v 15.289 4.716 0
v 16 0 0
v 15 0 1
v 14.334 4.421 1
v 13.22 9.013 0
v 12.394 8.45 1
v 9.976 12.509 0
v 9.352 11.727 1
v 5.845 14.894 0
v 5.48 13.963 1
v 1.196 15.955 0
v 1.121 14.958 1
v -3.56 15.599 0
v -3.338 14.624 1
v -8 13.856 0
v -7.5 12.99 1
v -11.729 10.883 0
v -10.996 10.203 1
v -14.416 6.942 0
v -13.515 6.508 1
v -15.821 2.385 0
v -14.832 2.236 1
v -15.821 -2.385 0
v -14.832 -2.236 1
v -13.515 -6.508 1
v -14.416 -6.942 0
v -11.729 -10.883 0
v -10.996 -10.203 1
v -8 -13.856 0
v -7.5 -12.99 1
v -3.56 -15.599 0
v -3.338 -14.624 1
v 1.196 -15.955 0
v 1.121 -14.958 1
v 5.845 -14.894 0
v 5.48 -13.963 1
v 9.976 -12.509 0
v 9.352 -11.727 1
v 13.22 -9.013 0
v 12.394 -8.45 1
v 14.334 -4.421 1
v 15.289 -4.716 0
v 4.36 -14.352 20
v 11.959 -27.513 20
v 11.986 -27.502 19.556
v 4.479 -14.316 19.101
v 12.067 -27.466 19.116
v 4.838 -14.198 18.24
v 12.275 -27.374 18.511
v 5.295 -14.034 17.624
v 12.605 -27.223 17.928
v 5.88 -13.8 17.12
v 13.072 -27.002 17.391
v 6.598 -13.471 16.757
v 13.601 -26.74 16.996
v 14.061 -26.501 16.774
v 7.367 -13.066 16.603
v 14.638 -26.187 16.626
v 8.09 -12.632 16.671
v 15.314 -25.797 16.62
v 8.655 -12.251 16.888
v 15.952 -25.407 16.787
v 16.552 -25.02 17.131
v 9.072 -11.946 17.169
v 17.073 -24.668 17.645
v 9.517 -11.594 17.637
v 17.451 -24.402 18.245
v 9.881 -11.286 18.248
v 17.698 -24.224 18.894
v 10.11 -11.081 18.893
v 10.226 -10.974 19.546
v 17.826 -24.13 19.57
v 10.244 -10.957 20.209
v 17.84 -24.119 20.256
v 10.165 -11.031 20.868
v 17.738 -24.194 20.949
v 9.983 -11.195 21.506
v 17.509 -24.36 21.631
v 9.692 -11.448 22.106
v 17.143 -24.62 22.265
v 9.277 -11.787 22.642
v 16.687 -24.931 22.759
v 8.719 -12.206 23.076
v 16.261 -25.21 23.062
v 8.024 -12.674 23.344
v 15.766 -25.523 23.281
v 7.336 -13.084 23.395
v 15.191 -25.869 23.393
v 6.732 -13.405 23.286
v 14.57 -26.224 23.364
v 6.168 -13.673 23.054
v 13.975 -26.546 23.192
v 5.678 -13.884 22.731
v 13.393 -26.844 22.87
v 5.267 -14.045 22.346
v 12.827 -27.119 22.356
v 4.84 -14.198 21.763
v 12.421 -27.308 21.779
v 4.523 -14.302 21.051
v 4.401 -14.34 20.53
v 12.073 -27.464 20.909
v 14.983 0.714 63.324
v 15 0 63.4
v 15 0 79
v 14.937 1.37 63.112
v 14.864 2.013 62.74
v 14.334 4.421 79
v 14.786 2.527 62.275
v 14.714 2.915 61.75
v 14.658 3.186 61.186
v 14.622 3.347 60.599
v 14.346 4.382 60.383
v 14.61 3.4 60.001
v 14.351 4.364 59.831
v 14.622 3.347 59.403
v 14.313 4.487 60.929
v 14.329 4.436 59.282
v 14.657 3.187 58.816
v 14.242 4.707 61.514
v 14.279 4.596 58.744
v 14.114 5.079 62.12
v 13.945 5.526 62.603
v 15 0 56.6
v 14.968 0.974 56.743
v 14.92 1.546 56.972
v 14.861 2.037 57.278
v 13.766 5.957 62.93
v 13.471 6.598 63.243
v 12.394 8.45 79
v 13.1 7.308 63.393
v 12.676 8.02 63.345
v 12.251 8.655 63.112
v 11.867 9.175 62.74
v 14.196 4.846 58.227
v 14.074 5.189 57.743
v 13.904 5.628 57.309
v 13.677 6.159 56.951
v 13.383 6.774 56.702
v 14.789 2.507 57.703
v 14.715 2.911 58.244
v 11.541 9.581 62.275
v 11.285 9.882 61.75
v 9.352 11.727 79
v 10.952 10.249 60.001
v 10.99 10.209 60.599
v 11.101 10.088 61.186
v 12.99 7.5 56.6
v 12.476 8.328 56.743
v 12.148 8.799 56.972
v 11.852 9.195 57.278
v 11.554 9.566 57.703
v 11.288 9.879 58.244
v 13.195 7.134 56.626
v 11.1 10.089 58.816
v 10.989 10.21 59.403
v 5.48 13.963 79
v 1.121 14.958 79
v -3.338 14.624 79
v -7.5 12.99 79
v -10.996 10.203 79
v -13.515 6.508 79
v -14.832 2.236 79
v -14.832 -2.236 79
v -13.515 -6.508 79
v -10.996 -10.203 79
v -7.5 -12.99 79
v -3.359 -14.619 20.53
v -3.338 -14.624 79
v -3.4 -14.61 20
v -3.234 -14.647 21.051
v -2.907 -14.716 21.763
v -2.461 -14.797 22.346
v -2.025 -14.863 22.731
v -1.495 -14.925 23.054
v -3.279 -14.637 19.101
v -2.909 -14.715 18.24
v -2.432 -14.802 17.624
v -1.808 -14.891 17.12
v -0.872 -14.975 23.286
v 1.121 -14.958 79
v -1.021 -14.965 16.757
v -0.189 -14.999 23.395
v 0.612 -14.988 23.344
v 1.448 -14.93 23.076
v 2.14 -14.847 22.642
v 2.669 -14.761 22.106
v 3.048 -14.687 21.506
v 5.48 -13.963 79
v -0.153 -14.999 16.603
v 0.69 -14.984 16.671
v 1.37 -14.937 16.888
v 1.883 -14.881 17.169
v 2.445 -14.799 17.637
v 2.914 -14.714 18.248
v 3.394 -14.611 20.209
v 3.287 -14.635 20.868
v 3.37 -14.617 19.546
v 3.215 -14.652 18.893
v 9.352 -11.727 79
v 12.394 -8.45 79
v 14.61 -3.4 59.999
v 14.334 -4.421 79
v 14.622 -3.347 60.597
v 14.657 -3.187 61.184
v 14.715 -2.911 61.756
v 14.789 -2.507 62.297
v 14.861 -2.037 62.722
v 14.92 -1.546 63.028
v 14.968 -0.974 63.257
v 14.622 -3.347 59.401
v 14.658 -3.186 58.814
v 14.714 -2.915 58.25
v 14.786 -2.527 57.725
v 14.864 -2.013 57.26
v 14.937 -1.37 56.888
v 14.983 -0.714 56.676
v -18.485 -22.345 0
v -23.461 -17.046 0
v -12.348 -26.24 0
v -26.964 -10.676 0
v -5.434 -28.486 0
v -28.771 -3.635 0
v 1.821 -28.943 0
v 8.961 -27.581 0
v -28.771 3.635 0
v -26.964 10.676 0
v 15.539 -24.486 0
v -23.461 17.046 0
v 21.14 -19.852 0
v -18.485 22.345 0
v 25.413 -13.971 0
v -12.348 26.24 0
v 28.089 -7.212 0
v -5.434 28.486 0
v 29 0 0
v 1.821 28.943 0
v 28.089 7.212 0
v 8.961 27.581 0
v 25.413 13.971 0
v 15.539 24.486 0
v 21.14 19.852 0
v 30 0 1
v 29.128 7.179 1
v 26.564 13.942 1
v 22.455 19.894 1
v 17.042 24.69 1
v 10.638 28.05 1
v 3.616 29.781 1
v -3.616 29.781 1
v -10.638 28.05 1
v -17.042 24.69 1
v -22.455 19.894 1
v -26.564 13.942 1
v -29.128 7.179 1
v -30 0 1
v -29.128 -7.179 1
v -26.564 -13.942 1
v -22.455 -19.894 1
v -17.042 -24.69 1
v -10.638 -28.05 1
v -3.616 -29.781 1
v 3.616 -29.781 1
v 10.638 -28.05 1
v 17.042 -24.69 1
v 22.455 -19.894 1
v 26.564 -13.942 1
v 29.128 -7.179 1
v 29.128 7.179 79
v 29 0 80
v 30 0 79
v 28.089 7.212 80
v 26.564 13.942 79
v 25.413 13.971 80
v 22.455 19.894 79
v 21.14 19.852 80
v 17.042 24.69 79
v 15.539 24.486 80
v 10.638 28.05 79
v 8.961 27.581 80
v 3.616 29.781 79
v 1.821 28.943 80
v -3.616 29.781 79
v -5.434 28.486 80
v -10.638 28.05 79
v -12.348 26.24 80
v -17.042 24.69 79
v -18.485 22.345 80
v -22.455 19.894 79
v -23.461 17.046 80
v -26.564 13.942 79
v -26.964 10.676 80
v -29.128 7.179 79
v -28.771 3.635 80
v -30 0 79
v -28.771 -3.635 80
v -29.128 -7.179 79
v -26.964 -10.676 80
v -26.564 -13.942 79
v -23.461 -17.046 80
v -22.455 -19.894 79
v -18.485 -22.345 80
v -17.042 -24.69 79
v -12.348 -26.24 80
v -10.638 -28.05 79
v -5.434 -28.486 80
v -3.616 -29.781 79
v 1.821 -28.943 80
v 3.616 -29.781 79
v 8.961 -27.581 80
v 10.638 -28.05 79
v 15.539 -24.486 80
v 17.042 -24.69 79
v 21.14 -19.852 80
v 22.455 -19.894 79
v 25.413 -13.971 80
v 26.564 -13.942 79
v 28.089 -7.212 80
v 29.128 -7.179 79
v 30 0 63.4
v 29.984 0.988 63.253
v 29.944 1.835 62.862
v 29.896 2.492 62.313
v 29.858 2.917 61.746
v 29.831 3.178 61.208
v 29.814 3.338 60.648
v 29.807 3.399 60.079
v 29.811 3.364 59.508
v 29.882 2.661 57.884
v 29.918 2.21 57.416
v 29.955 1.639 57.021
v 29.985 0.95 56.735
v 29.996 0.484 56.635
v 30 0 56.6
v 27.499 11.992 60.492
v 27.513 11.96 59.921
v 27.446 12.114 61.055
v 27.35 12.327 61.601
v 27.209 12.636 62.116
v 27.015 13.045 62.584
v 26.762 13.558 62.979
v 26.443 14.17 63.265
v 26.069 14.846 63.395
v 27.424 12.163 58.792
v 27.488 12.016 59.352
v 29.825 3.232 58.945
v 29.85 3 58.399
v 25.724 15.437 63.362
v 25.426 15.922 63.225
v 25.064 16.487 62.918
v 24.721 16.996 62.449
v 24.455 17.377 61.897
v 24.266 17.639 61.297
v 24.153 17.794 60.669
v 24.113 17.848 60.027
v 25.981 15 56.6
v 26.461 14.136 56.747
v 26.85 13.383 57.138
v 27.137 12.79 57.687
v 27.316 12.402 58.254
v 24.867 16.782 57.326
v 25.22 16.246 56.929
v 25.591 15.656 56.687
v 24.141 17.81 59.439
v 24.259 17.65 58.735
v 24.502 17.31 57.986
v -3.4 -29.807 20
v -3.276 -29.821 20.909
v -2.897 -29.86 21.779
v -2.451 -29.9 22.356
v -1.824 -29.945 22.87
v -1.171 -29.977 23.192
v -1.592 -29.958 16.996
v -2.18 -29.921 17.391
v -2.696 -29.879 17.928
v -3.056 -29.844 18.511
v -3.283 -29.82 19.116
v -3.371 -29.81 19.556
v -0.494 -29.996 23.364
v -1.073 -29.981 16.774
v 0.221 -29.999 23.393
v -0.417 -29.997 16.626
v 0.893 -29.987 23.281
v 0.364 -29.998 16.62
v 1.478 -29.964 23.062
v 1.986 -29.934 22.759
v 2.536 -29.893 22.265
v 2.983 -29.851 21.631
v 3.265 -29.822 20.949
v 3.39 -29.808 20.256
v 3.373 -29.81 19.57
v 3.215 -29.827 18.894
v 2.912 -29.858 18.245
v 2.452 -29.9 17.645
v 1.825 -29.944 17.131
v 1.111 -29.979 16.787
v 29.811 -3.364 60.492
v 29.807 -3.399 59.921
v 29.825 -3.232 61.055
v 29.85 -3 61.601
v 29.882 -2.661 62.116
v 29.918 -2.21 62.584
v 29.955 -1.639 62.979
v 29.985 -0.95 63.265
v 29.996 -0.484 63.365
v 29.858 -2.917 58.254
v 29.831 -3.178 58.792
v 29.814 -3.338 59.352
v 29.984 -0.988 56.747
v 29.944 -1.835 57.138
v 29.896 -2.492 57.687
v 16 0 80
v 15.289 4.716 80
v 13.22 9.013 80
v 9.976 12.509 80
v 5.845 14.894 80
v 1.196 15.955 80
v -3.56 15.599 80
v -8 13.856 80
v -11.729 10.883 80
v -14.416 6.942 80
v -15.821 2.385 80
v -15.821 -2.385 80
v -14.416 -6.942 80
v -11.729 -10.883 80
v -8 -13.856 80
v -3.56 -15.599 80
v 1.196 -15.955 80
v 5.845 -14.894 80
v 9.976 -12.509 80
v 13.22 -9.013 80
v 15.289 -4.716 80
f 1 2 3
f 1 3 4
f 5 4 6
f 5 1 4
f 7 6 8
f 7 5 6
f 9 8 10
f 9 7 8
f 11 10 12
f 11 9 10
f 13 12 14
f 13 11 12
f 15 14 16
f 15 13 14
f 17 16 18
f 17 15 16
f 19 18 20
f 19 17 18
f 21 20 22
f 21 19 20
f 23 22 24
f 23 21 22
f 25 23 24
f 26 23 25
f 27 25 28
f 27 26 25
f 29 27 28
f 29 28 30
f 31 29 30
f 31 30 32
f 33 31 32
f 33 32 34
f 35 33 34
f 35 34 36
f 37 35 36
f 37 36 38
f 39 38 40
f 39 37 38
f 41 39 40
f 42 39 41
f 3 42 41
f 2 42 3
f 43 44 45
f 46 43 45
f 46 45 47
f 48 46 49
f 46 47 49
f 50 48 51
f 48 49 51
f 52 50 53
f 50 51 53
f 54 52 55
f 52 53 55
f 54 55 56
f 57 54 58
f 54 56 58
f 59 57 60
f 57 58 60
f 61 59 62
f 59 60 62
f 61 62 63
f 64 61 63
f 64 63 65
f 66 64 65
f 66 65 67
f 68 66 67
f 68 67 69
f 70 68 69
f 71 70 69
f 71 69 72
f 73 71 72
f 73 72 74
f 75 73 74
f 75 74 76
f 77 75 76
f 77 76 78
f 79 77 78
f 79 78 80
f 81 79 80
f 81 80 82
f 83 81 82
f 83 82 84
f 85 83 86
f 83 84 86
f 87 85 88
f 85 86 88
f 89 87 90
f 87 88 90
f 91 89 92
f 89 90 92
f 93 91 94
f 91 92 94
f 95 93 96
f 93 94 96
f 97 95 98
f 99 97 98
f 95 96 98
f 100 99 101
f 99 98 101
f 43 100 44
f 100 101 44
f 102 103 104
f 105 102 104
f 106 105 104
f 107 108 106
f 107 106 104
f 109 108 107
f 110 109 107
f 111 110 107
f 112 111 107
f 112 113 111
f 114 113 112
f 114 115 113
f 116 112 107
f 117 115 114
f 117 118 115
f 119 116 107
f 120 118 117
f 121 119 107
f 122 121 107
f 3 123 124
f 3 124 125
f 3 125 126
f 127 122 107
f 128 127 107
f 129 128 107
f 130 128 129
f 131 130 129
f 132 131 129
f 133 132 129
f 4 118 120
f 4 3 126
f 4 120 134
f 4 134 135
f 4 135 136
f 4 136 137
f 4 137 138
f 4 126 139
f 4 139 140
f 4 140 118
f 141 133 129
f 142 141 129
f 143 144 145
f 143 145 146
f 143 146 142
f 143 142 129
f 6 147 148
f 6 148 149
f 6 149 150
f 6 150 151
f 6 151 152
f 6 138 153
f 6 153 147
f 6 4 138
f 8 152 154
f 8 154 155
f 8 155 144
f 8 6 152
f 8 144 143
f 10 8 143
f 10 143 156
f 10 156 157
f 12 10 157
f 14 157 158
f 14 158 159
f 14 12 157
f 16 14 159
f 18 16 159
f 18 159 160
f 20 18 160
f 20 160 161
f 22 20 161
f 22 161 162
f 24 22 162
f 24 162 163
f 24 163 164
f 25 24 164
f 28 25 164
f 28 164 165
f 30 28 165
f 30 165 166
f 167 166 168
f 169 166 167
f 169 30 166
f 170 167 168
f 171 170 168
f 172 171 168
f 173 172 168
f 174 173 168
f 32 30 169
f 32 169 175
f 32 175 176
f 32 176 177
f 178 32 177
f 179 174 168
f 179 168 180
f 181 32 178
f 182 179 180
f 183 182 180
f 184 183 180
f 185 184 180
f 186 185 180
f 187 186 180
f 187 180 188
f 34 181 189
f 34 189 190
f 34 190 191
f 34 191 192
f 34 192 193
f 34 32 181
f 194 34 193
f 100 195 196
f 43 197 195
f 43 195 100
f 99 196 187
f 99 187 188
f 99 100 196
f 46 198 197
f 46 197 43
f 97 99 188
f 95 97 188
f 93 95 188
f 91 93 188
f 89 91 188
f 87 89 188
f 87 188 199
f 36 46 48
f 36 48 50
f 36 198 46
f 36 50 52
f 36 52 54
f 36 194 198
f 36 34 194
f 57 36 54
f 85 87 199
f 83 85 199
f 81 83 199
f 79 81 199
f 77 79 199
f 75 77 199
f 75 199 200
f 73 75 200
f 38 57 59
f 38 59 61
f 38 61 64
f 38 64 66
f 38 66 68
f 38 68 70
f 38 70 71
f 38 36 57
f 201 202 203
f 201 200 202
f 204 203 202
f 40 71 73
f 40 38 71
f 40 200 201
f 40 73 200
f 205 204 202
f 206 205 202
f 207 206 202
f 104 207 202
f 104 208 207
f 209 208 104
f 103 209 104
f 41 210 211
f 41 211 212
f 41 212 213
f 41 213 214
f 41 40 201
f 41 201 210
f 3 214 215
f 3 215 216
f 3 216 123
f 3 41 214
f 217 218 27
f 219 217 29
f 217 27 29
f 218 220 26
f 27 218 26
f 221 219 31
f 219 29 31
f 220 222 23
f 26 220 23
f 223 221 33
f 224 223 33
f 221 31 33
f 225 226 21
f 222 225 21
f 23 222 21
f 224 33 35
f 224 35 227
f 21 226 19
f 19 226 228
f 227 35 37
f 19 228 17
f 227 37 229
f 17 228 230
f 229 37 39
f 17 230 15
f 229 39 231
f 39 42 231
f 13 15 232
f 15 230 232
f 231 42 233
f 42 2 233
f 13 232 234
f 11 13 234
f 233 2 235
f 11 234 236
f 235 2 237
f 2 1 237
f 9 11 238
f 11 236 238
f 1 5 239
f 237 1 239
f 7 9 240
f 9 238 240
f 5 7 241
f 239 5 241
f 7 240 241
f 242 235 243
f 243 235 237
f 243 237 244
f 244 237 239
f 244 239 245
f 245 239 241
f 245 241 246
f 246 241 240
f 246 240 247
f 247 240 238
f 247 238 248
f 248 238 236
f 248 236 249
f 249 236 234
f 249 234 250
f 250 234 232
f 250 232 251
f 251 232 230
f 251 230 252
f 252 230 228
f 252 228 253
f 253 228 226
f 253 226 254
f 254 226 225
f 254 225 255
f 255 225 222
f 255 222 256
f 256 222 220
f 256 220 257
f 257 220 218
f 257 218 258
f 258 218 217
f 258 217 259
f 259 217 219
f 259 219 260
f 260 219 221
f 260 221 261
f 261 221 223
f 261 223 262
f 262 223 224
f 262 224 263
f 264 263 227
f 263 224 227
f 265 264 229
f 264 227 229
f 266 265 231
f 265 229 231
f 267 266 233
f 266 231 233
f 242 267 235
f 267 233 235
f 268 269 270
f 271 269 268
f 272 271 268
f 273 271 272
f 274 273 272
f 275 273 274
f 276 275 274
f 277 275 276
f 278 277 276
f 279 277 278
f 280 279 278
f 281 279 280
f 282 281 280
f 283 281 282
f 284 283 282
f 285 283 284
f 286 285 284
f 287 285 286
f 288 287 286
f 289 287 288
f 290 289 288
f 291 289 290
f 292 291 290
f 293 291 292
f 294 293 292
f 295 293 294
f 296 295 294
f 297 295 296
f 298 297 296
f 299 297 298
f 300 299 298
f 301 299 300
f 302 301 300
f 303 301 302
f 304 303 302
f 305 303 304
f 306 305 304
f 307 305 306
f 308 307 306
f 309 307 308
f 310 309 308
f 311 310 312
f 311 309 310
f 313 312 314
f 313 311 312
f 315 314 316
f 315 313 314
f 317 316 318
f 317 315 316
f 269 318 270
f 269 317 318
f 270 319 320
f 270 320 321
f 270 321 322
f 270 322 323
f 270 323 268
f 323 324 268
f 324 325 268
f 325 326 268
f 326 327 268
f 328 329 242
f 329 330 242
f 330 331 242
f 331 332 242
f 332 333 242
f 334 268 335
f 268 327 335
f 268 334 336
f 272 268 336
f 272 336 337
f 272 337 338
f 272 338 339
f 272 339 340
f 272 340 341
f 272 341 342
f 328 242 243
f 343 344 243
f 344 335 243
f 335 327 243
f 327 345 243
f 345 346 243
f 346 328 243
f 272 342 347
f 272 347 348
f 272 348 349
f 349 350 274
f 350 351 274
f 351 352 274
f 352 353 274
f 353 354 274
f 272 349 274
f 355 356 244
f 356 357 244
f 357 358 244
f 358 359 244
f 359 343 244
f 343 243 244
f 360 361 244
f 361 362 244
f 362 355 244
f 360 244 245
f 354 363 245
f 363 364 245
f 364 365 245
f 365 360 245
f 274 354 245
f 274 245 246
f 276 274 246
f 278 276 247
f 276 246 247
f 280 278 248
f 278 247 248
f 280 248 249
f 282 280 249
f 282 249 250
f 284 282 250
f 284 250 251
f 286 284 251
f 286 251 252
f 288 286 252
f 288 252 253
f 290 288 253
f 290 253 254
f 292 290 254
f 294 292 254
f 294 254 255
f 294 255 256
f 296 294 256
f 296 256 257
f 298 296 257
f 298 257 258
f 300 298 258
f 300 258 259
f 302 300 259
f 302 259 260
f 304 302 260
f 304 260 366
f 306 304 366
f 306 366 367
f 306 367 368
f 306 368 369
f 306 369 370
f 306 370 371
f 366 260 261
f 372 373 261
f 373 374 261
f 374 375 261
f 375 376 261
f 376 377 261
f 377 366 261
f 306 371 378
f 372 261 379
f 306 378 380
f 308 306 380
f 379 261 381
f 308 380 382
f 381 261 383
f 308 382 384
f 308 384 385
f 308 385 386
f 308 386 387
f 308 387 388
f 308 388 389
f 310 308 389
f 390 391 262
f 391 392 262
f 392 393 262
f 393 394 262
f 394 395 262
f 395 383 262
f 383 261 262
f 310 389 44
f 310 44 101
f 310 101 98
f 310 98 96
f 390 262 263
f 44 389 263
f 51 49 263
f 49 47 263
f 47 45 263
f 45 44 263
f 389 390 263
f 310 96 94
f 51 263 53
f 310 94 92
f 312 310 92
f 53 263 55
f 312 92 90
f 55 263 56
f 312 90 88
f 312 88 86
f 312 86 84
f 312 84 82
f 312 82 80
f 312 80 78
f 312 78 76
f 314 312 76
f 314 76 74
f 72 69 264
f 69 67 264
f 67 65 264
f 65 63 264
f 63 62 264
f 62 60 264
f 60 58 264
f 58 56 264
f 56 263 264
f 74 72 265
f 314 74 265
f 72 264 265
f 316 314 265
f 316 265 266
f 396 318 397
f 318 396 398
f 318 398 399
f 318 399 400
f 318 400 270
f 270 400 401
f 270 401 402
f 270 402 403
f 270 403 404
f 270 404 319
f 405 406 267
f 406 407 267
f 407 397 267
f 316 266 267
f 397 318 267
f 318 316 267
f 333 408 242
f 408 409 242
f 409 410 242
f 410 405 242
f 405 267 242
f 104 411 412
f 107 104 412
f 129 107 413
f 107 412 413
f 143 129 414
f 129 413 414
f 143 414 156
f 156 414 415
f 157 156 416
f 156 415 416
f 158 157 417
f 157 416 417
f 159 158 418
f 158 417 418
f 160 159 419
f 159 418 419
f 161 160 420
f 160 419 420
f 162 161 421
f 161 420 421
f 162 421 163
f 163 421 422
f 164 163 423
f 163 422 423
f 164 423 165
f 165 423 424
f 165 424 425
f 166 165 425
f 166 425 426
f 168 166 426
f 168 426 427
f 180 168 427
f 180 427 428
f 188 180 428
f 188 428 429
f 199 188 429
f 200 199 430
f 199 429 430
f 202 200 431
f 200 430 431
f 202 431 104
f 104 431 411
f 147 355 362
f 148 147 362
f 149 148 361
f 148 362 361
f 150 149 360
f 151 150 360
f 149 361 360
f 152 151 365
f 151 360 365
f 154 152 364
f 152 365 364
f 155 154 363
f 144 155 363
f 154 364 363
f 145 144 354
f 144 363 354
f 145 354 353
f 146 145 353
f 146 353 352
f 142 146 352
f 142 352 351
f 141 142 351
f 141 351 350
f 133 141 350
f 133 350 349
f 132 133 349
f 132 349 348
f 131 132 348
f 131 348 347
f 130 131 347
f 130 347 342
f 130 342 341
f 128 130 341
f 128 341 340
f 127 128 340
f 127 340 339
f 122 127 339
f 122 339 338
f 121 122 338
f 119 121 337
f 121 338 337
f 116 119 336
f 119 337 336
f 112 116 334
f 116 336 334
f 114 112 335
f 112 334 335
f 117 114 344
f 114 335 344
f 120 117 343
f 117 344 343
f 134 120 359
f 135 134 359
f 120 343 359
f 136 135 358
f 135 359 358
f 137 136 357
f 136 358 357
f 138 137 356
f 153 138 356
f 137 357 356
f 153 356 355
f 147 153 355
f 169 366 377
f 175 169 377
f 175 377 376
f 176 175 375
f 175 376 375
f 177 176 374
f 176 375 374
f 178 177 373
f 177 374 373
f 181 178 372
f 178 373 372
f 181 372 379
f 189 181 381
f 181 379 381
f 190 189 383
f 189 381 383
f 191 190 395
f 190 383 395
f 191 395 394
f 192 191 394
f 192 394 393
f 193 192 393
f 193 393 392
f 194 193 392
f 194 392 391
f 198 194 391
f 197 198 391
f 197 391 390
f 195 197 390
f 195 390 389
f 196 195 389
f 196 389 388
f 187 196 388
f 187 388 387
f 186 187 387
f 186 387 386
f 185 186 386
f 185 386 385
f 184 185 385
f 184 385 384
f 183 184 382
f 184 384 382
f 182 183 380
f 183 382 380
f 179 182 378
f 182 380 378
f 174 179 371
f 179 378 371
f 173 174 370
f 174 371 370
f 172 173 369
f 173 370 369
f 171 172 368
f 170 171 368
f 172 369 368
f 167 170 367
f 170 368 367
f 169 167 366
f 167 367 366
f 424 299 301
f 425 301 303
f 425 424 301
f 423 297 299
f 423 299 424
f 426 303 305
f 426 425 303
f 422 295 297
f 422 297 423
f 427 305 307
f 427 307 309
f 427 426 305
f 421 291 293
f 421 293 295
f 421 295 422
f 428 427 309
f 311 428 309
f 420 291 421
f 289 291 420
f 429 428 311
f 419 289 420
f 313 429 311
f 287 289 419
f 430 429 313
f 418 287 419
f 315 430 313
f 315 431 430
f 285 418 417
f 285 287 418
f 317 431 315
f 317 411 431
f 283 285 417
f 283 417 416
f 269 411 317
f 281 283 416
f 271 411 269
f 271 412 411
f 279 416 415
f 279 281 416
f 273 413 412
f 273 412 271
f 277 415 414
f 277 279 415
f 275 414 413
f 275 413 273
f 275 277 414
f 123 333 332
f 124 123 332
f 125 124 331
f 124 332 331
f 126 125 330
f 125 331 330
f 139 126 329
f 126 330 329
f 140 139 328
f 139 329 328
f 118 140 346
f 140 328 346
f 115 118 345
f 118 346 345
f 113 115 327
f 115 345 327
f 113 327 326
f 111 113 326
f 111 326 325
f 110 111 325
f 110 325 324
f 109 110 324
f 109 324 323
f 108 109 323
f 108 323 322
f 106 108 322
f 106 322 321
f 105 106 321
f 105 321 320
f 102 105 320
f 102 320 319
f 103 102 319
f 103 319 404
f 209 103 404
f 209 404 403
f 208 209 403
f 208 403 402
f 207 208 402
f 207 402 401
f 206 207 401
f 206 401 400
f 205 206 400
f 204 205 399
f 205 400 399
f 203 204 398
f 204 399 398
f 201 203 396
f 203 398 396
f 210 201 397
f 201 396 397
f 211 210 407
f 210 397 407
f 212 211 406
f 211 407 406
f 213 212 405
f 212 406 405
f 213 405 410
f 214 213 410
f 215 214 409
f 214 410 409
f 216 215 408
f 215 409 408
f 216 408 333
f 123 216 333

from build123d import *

# Parameters (mm, degrees)
SKICA1_R                  = 30
SKICA1_R_2                = 15
P_IDAT_VYSUNUT_M1_DEPTH   = 80
ZKOSEN_1_SIZE             = 1
M8_Z_VIT1_REACH           = 62
M8_Z_VIT1_BORE_R          = 3.4
M8_Z_VIT1_ON_FACE_2_REACH = 72.981
M8_Z_VIT1_BORE_2_R        = 3.4
M8_Z_VIT2_REACH           = 62
M8_Z_VIT2_BORE_R          = 3.4
KRUHOV_POLE1_COUNT        = 2
KRUHOV_POLE1_ANGLE        = 30


with BuildPart() as part:
    # Skica1 → Přidat vysunutím1 (new body)
    with BuildSketch(Plane.XY):
        Circle(SKICA1_R)
        Circle(SKICA1_R_2, mode=Mode.SUBTRACT)
    extrude(amount=P_IDAT_VYSUNUT_M1_DEPTH)

    # Zkosení1
    zkosen_1_edges = [part.edges().sort_by_distance(p)[0] for p in [
        (-30, 0, 0),
        (-30, 0, 80),
        (-15, 0, 0),
        (-15, 0, 80),
    ]]
    chamfer(zkosen_1_edges, length=ZKOSEN_1_SIZE)

    # M8 závit1 bore (on position points) → M8 závit1 (cut, up to next)
    with BuildSketch(Plane(origin=(0, -30, 20), x_dir=(-1, 0, 0), z_dir=(0, -1, 0)), mode=Mode.PRIVATE) as m8_z_vit1_sk1:
        Circle(M8_Z_VIT1_BORE_R)
    m8_z_vit1_tool1 = extrude(m8_z_vit1_sk1.sketch, amount=-M8_Z_VIT1_REACH, mode=Mode.PRIVATE) & part.part
    add(m8_z_vit1_tool1.solids().sort_by_distance((0, -30, 20))[0], mode=Mode.SUBTRACT)

    # M8 závit1 bore 2 (on position points) → M8 závit1 on face 2 (cut, up to next)
    with BuildSketch(Plane(origin=(15, -25.980762114, 20), x_dir=(-0.866025303, -0.500000175, 0), z_dir=(0.500000175, -0.866025303, 0)), mode=Mode.PRIVATE) as m8_z_vit1_on_face_2_sk1:
        Circle(M8_Z_VIT1_BORE_2_R)
    m8_z_vit1_on_face_2_tool1 = extrude(m8_z_vit1_on_face_2_sk1.sketch, amount=-M8_Z_VIT1_ON_FACE_2_REACH, mode=Mode.PRIVATE) & part.part
    add(m8_z_vit1_on_face_2_tool1.solids().sort_by_distance((15, -25.980762, 20))[0], mode=Mode.SUBTRACT)

    # M8 závit2 bore → M8 závit2 (cut, up to next)
    with BuildSketch(Plane(origin=(30, 0, 0), x_dir=(0, 0, -1), z_dir=(1, 0, 0)), mode=Mode.PRIVATE) as m8_z_vit2_sk1:
        with Locations((-60, 0)):
            Circle(M8_Z_VIT2_BORE_R)
    m8_z_vit2_tool1 = extrude(m8_z_vit2_sk1.sketch, amount=-M8_Z_VIT2_REACH, mode=Mode.PRIVATE) & part.part
    m8_z_vit2 = m8_z_vit2_tool1.solids().sort_by_distance((30, 0, 60))[0]
    add(m8_z_vit2, mode=Mode.SUBTRACT)

    # Kruhové pole1: M8 závit2 ×2 about axis
    kruhov_pole1_axis = Axis((0, 0, 80), (0, 0, 1))
    for i in range(1, KRUHOV_POLE1_COUNT):
        add(m8_z_vit2.rotate(kruhov_pole1_axis, i * KRUHOV_POLE1_ANGLE / (KRUHOV_POLE1_COUNT - 1)), mode=Mode.SUBTRACT)


solid = part.part
